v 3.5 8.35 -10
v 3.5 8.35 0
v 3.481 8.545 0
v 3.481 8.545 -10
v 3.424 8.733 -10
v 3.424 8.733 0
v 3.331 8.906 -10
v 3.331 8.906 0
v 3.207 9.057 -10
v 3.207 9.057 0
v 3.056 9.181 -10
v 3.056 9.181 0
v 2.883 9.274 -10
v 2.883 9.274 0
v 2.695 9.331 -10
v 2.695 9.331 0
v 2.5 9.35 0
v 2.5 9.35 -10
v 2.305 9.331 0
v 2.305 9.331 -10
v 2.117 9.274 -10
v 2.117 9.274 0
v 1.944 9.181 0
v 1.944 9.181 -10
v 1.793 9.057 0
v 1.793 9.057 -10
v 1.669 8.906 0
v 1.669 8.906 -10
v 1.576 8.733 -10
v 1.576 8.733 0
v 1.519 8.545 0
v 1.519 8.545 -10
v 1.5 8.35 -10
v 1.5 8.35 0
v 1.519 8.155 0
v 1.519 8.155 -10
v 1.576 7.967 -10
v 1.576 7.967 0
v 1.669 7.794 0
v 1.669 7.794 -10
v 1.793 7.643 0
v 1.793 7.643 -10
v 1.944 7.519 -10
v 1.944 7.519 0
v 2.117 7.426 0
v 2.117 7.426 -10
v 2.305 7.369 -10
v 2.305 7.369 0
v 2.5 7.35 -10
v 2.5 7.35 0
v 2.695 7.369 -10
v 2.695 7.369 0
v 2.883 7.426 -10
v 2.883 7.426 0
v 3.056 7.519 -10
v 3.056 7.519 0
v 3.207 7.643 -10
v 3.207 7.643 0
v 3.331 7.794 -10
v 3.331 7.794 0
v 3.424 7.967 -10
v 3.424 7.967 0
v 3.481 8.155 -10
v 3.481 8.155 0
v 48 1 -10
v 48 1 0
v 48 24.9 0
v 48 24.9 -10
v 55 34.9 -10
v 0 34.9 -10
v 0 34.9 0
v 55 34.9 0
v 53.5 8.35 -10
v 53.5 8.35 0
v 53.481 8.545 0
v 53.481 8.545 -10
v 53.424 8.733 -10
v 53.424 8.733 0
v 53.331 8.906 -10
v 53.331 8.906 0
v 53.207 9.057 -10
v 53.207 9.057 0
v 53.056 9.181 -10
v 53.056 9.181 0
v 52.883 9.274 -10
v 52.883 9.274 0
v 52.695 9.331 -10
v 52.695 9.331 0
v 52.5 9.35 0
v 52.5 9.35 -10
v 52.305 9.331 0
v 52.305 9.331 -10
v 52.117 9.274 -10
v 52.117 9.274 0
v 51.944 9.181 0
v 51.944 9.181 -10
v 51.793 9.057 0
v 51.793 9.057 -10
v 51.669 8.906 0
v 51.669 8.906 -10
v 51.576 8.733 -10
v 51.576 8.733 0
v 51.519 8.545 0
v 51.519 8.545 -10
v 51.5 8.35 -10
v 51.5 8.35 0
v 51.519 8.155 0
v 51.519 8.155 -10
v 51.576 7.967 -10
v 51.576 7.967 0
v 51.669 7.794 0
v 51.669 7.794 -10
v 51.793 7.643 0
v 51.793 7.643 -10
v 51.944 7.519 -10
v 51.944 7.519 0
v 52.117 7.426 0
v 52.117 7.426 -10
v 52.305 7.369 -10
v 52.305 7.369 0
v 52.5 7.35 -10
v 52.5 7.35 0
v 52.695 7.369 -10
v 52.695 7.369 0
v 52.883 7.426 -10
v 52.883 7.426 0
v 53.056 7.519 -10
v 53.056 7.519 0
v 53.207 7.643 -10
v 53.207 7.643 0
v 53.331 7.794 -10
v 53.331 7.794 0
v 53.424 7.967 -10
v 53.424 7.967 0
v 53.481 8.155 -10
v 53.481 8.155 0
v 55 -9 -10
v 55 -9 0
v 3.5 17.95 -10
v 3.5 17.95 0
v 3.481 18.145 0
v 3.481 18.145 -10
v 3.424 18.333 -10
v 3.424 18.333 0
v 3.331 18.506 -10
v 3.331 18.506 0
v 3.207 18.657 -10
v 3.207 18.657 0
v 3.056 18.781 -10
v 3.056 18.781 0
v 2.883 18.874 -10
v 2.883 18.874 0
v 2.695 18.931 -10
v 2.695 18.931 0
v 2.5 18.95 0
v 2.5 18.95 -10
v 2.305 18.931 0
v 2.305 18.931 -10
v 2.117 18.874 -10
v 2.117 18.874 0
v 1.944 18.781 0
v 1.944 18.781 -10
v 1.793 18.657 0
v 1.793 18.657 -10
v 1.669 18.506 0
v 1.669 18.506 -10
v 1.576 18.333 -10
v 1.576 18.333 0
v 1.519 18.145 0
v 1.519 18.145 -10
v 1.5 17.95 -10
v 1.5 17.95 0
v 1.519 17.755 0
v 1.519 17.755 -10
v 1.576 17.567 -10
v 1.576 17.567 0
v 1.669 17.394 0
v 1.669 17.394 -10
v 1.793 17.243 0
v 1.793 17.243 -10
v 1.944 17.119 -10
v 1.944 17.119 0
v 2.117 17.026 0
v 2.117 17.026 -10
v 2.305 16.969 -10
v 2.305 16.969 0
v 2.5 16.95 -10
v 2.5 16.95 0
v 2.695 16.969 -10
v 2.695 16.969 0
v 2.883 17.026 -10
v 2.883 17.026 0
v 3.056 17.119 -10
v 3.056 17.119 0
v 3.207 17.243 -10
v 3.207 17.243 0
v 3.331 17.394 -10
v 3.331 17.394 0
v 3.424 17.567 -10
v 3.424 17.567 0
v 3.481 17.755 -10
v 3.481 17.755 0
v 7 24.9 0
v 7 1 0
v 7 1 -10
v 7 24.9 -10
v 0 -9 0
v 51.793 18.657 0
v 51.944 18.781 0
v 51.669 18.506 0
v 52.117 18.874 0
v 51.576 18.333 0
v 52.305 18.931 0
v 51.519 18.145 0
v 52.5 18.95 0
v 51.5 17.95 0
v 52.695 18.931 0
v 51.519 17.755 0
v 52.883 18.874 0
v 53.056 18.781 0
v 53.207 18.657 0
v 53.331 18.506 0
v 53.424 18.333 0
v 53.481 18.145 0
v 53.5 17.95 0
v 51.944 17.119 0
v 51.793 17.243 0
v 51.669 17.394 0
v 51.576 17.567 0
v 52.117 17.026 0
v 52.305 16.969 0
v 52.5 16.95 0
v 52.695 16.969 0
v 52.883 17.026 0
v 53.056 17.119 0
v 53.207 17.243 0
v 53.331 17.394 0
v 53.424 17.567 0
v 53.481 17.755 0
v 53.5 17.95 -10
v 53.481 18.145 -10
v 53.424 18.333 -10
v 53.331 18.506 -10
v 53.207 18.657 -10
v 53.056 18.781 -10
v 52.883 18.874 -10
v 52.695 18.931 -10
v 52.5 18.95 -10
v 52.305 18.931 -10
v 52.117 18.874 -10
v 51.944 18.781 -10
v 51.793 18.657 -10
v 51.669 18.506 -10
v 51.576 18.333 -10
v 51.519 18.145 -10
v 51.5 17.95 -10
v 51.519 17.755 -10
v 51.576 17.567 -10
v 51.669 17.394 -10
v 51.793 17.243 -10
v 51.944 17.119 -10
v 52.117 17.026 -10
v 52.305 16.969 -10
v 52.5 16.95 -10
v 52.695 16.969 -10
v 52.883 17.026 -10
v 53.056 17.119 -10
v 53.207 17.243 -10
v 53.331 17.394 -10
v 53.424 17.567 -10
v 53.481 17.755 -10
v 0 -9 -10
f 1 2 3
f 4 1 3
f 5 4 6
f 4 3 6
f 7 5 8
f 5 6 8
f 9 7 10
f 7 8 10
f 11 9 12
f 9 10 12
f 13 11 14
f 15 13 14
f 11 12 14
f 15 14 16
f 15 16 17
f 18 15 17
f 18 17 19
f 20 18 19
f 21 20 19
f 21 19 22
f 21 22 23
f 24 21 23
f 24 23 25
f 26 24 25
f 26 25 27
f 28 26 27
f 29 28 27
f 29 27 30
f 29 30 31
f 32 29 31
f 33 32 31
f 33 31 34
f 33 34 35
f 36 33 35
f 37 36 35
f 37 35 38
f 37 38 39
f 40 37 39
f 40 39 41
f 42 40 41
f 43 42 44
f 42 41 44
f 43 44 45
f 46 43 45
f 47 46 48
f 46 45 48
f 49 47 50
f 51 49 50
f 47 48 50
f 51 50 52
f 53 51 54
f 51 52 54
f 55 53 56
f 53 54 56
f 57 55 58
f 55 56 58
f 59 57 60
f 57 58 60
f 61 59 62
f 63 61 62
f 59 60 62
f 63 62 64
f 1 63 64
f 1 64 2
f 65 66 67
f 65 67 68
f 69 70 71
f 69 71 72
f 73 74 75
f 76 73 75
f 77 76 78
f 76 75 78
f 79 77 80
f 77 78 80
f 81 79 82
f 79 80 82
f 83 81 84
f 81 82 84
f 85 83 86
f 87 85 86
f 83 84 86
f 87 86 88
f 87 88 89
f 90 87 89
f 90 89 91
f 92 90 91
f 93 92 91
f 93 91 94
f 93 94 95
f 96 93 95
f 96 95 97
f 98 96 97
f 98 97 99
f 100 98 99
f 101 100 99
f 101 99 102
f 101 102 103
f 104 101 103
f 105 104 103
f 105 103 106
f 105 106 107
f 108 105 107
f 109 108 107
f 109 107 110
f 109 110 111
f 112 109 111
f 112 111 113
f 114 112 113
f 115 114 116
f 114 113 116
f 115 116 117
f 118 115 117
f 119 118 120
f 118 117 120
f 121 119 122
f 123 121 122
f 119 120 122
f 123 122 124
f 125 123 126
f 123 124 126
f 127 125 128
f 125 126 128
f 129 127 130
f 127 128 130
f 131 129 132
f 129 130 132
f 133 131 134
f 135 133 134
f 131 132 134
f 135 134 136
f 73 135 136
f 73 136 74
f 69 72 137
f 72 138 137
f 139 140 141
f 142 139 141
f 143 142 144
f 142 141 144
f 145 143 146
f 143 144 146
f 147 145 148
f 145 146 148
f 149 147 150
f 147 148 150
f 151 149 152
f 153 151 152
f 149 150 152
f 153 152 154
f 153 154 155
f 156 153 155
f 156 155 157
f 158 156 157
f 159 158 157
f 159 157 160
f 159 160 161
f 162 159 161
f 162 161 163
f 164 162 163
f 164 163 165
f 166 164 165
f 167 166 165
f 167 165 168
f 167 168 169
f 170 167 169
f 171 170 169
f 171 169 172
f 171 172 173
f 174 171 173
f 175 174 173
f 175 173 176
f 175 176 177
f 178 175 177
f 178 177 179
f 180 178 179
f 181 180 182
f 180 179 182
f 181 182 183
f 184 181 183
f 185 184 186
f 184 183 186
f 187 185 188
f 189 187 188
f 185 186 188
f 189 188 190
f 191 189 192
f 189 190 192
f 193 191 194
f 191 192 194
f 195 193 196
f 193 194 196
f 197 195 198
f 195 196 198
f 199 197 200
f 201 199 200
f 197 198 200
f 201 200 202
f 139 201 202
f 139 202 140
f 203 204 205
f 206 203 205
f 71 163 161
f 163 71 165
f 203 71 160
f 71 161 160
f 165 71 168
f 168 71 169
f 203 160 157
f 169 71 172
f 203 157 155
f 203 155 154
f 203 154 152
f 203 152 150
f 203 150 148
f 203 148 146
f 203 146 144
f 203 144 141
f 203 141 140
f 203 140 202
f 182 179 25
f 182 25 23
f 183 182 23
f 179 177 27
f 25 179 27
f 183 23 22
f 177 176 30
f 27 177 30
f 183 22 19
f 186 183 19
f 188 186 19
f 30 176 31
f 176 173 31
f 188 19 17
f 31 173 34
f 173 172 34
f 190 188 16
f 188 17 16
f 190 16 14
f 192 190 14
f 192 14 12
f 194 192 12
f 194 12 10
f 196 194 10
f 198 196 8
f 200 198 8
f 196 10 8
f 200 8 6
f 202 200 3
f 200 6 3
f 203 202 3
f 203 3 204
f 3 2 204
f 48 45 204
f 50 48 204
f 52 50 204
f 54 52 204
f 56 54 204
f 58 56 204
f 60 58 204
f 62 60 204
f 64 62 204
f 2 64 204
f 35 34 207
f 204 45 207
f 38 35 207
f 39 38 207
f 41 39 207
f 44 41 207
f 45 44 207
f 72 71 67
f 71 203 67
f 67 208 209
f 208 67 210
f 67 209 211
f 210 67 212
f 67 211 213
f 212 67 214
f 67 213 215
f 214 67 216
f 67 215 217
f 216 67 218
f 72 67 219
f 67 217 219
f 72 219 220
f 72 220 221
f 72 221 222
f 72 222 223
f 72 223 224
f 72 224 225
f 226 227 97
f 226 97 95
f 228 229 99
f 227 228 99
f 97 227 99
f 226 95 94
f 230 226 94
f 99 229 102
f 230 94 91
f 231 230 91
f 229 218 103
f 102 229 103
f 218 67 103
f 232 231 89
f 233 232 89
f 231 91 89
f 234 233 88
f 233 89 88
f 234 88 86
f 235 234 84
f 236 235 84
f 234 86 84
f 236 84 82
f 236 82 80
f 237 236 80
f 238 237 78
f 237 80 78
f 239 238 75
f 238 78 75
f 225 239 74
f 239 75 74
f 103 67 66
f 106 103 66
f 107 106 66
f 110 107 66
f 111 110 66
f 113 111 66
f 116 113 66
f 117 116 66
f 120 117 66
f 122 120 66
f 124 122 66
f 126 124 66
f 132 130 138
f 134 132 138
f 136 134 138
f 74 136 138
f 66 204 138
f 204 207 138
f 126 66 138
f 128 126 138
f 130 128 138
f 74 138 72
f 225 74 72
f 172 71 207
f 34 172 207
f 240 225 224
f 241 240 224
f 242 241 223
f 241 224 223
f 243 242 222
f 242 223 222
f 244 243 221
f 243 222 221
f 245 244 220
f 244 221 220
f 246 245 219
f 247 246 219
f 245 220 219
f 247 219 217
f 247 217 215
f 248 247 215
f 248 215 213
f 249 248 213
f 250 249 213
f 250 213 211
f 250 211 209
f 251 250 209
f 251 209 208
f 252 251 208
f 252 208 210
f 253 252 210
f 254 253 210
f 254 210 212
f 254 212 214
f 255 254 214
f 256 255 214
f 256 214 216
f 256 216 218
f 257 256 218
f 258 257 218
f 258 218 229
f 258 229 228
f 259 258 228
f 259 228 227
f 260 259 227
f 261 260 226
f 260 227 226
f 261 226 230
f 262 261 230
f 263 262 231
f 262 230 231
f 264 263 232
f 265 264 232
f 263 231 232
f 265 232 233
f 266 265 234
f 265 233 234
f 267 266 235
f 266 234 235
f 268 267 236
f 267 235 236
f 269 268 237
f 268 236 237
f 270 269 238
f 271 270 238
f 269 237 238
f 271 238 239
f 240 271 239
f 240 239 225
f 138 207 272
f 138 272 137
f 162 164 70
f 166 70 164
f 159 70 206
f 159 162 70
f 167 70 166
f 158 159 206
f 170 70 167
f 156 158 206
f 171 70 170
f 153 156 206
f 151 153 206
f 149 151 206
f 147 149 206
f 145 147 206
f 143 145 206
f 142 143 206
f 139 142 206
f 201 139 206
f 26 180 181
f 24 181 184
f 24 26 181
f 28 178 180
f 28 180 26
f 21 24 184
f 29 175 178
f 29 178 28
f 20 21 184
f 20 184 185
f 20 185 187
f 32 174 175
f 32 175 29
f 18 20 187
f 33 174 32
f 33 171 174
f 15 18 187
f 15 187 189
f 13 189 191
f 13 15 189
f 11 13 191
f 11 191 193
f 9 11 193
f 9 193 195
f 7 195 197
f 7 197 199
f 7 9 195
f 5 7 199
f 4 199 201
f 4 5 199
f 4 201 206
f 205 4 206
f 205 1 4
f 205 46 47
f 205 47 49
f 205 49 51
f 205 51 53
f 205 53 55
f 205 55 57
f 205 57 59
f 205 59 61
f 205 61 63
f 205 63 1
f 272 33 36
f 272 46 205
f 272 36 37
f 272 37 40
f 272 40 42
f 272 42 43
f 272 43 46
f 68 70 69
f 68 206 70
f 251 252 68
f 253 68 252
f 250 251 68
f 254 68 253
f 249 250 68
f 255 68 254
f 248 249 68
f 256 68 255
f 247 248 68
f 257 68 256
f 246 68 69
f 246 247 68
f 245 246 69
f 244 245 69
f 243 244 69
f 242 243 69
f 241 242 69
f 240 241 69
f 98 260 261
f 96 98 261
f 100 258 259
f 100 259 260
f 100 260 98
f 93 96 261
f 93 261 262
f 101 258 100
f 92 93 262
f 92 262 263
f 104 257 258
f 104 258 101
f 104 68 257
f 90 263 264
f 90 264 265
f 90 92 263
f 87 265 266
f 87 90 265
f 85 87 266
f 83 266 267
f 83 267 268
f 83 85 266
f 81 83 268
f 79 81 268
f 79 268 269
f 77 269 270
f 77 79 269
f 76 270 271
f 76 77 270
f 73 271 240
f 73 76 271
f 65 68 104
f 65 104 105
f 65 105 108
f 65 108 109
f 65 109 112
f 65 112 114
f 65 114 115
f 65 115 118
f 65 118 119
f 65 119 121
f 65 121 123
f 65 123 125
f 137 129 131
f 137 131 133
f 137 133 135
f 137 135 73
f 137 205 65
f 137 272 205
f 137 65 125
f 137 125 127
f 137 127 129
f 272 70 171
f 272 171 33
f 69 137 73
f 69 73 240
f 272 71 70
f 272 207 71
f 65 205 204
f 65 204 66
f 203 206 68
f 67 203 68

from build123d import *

# Parameters (mm, degrees)
SKETCH1_W           = 55
SKETCH1_H           = 10
BOSS_EXTRUDE1_DEPTH = 1
SKETCH2_W           = 7
SKETCH2_H           = 10
BOSS_EXTRUDE2_DEPTH = 23.9
CUT_EXTRUDE2_REACH  = 63.196
SKETCH4_R           = 1
SKETCH5_W           = 55
SKETCH5_H           = 10
BOSS_EXTRUDE3_DEPTH = 9
SKETCH6_W           = 55
SKETCH6_H           = 10
BOSS_EXTRUDE4_DEPTH = 10


with BuildPart() as part:
    # Sketch1 → Boss-Extrude1 (new body)
    with BuildSketch(Plane(origin=(0, 0, 0), x_dir=(1, 0, 0), z_dir=(0, 1, 0))):
        with Locations((27.5, 5)):
            Rectangle(SKETCH1_W, SKETCH1_H)
    extrude(amount=BOSS_EXTRUDE1_DEPTH)

    # Sketch2 → Boss-Extrude2 (add)
    with BuildSketch(Plane(origin=(0, 1, 0), x_dir=(1, 0, 0), z_dir=(0, 1, 0))):
        with Locations((51.5, 5)):
            Rectangle(SKETCH2_W, SKETCH2_H)
        with Locations((3.5, 5)):
            Rectangle(SKETCH2_W, SKETCH2_H)
    extrude(amount=BOSS_EXTRUDE2_DEPTH)

    # Sketch4 → Cut-Extrude2 (cut, up to next)
    with BuildSketch(Plane.XY, mode=Mode.PRIVATE) as cut_extrude2_sk1:
        with Locations((2.5, 17.95)):
            Circle(SKETCH4_R)
    cut_extrude2_tool1 = extrude(cut_extrude2_sk1.sketch, amount=-CUT_EXTRUDE2_REACH, mode=Mode.PRIVATE) & part.part
    # Sketch4 → Cut-Extrude2 (cut, up to next)
    with BuildSketch(Plane.XY, mode=Mode.PRIVATE) as cut_extrude2_sk2:
        with Locations((2.5, 8.35)):
            Circle(SKETCH4_R)
    cut_extrude2_tool2 = extrude(cut_extrude2_sk2.sketch, amount=-CUT_EXTRUDE2_REACH, mode=Mode.PRIVATE) & part.part
    # Sketch4 → Cut-Extrude2 (cut, up to next)
    with BuildSketch(Plane.XY, mode=Mode.PRIVATE) as cut_extrude2_sk3:
        with Locations((52.5, 8.35)):
            Circle(SKETCH4_R)
    cut_extrude2_tool3 = extrude(cut_extrude2_sk3.sketch, amount=-CUT_EXTRUDE2_REACH, mode=Mode.PRIVATE) & part.part
    # Sketch4 → Cut-Extrude2 (cut, up to next)
    with BuildSketch(Plane.XY, mode=Mode.PRIVATE) as cut_extrude2_sk4:
        with Locations((52.5, 17.95)):
            Circle(SKETCH4_R)
    cut_extrude2_tool4 = extrude(cut_extrude2_sk4.sketch, amount=-CUT_EXTRUDE2_REACH, mode=Mode.PRIVATE) & part.part
    add(cut_extrude2_tool1.solids().sort_by_distance((2.5, 17.95, 0))[0], mode=Mode.SUBTRACT)
    add(cut_extrude2_tool2.solids().sort_by_distance((2.5, 8.35, 0))[0], mode=Mode.SUBTRACT)
    add(cut_extrude2_tool3.solids().sort_by_distance((52.5, 8.35, 0))[0], mode=Mode.SUBTRACT)
    add(cut_extrude2_tool4.solids().sort_by_distance((52.5, 17.95, 0))[0], mode=Mode.SUBTRACT)

    # Sketch5 → Boss-Extrude3 (add)
    with BuildSketch(Plane.XZ):
        with Locations((27.5, -5)):
            Rectangle(SKETCH5_W, SKETCH5_H)
    extrude(amount=BOSS_EXTRUDE3_DEPTH)

    # Sketch6 → Boss-Extrude4 (add)
    with BuildSketch(Plane(origin=(0, 24.9, 0), x_dir=(1, 0, 0), z_dir=(0, 1, 0))):
        with Locations((27.5, 5)):
            Rectangle(SKETCH6_W, SKETCH6_H)
    extrude(amount=BOSS_EXTRUDE4_DEPTH)


solid = part.part
